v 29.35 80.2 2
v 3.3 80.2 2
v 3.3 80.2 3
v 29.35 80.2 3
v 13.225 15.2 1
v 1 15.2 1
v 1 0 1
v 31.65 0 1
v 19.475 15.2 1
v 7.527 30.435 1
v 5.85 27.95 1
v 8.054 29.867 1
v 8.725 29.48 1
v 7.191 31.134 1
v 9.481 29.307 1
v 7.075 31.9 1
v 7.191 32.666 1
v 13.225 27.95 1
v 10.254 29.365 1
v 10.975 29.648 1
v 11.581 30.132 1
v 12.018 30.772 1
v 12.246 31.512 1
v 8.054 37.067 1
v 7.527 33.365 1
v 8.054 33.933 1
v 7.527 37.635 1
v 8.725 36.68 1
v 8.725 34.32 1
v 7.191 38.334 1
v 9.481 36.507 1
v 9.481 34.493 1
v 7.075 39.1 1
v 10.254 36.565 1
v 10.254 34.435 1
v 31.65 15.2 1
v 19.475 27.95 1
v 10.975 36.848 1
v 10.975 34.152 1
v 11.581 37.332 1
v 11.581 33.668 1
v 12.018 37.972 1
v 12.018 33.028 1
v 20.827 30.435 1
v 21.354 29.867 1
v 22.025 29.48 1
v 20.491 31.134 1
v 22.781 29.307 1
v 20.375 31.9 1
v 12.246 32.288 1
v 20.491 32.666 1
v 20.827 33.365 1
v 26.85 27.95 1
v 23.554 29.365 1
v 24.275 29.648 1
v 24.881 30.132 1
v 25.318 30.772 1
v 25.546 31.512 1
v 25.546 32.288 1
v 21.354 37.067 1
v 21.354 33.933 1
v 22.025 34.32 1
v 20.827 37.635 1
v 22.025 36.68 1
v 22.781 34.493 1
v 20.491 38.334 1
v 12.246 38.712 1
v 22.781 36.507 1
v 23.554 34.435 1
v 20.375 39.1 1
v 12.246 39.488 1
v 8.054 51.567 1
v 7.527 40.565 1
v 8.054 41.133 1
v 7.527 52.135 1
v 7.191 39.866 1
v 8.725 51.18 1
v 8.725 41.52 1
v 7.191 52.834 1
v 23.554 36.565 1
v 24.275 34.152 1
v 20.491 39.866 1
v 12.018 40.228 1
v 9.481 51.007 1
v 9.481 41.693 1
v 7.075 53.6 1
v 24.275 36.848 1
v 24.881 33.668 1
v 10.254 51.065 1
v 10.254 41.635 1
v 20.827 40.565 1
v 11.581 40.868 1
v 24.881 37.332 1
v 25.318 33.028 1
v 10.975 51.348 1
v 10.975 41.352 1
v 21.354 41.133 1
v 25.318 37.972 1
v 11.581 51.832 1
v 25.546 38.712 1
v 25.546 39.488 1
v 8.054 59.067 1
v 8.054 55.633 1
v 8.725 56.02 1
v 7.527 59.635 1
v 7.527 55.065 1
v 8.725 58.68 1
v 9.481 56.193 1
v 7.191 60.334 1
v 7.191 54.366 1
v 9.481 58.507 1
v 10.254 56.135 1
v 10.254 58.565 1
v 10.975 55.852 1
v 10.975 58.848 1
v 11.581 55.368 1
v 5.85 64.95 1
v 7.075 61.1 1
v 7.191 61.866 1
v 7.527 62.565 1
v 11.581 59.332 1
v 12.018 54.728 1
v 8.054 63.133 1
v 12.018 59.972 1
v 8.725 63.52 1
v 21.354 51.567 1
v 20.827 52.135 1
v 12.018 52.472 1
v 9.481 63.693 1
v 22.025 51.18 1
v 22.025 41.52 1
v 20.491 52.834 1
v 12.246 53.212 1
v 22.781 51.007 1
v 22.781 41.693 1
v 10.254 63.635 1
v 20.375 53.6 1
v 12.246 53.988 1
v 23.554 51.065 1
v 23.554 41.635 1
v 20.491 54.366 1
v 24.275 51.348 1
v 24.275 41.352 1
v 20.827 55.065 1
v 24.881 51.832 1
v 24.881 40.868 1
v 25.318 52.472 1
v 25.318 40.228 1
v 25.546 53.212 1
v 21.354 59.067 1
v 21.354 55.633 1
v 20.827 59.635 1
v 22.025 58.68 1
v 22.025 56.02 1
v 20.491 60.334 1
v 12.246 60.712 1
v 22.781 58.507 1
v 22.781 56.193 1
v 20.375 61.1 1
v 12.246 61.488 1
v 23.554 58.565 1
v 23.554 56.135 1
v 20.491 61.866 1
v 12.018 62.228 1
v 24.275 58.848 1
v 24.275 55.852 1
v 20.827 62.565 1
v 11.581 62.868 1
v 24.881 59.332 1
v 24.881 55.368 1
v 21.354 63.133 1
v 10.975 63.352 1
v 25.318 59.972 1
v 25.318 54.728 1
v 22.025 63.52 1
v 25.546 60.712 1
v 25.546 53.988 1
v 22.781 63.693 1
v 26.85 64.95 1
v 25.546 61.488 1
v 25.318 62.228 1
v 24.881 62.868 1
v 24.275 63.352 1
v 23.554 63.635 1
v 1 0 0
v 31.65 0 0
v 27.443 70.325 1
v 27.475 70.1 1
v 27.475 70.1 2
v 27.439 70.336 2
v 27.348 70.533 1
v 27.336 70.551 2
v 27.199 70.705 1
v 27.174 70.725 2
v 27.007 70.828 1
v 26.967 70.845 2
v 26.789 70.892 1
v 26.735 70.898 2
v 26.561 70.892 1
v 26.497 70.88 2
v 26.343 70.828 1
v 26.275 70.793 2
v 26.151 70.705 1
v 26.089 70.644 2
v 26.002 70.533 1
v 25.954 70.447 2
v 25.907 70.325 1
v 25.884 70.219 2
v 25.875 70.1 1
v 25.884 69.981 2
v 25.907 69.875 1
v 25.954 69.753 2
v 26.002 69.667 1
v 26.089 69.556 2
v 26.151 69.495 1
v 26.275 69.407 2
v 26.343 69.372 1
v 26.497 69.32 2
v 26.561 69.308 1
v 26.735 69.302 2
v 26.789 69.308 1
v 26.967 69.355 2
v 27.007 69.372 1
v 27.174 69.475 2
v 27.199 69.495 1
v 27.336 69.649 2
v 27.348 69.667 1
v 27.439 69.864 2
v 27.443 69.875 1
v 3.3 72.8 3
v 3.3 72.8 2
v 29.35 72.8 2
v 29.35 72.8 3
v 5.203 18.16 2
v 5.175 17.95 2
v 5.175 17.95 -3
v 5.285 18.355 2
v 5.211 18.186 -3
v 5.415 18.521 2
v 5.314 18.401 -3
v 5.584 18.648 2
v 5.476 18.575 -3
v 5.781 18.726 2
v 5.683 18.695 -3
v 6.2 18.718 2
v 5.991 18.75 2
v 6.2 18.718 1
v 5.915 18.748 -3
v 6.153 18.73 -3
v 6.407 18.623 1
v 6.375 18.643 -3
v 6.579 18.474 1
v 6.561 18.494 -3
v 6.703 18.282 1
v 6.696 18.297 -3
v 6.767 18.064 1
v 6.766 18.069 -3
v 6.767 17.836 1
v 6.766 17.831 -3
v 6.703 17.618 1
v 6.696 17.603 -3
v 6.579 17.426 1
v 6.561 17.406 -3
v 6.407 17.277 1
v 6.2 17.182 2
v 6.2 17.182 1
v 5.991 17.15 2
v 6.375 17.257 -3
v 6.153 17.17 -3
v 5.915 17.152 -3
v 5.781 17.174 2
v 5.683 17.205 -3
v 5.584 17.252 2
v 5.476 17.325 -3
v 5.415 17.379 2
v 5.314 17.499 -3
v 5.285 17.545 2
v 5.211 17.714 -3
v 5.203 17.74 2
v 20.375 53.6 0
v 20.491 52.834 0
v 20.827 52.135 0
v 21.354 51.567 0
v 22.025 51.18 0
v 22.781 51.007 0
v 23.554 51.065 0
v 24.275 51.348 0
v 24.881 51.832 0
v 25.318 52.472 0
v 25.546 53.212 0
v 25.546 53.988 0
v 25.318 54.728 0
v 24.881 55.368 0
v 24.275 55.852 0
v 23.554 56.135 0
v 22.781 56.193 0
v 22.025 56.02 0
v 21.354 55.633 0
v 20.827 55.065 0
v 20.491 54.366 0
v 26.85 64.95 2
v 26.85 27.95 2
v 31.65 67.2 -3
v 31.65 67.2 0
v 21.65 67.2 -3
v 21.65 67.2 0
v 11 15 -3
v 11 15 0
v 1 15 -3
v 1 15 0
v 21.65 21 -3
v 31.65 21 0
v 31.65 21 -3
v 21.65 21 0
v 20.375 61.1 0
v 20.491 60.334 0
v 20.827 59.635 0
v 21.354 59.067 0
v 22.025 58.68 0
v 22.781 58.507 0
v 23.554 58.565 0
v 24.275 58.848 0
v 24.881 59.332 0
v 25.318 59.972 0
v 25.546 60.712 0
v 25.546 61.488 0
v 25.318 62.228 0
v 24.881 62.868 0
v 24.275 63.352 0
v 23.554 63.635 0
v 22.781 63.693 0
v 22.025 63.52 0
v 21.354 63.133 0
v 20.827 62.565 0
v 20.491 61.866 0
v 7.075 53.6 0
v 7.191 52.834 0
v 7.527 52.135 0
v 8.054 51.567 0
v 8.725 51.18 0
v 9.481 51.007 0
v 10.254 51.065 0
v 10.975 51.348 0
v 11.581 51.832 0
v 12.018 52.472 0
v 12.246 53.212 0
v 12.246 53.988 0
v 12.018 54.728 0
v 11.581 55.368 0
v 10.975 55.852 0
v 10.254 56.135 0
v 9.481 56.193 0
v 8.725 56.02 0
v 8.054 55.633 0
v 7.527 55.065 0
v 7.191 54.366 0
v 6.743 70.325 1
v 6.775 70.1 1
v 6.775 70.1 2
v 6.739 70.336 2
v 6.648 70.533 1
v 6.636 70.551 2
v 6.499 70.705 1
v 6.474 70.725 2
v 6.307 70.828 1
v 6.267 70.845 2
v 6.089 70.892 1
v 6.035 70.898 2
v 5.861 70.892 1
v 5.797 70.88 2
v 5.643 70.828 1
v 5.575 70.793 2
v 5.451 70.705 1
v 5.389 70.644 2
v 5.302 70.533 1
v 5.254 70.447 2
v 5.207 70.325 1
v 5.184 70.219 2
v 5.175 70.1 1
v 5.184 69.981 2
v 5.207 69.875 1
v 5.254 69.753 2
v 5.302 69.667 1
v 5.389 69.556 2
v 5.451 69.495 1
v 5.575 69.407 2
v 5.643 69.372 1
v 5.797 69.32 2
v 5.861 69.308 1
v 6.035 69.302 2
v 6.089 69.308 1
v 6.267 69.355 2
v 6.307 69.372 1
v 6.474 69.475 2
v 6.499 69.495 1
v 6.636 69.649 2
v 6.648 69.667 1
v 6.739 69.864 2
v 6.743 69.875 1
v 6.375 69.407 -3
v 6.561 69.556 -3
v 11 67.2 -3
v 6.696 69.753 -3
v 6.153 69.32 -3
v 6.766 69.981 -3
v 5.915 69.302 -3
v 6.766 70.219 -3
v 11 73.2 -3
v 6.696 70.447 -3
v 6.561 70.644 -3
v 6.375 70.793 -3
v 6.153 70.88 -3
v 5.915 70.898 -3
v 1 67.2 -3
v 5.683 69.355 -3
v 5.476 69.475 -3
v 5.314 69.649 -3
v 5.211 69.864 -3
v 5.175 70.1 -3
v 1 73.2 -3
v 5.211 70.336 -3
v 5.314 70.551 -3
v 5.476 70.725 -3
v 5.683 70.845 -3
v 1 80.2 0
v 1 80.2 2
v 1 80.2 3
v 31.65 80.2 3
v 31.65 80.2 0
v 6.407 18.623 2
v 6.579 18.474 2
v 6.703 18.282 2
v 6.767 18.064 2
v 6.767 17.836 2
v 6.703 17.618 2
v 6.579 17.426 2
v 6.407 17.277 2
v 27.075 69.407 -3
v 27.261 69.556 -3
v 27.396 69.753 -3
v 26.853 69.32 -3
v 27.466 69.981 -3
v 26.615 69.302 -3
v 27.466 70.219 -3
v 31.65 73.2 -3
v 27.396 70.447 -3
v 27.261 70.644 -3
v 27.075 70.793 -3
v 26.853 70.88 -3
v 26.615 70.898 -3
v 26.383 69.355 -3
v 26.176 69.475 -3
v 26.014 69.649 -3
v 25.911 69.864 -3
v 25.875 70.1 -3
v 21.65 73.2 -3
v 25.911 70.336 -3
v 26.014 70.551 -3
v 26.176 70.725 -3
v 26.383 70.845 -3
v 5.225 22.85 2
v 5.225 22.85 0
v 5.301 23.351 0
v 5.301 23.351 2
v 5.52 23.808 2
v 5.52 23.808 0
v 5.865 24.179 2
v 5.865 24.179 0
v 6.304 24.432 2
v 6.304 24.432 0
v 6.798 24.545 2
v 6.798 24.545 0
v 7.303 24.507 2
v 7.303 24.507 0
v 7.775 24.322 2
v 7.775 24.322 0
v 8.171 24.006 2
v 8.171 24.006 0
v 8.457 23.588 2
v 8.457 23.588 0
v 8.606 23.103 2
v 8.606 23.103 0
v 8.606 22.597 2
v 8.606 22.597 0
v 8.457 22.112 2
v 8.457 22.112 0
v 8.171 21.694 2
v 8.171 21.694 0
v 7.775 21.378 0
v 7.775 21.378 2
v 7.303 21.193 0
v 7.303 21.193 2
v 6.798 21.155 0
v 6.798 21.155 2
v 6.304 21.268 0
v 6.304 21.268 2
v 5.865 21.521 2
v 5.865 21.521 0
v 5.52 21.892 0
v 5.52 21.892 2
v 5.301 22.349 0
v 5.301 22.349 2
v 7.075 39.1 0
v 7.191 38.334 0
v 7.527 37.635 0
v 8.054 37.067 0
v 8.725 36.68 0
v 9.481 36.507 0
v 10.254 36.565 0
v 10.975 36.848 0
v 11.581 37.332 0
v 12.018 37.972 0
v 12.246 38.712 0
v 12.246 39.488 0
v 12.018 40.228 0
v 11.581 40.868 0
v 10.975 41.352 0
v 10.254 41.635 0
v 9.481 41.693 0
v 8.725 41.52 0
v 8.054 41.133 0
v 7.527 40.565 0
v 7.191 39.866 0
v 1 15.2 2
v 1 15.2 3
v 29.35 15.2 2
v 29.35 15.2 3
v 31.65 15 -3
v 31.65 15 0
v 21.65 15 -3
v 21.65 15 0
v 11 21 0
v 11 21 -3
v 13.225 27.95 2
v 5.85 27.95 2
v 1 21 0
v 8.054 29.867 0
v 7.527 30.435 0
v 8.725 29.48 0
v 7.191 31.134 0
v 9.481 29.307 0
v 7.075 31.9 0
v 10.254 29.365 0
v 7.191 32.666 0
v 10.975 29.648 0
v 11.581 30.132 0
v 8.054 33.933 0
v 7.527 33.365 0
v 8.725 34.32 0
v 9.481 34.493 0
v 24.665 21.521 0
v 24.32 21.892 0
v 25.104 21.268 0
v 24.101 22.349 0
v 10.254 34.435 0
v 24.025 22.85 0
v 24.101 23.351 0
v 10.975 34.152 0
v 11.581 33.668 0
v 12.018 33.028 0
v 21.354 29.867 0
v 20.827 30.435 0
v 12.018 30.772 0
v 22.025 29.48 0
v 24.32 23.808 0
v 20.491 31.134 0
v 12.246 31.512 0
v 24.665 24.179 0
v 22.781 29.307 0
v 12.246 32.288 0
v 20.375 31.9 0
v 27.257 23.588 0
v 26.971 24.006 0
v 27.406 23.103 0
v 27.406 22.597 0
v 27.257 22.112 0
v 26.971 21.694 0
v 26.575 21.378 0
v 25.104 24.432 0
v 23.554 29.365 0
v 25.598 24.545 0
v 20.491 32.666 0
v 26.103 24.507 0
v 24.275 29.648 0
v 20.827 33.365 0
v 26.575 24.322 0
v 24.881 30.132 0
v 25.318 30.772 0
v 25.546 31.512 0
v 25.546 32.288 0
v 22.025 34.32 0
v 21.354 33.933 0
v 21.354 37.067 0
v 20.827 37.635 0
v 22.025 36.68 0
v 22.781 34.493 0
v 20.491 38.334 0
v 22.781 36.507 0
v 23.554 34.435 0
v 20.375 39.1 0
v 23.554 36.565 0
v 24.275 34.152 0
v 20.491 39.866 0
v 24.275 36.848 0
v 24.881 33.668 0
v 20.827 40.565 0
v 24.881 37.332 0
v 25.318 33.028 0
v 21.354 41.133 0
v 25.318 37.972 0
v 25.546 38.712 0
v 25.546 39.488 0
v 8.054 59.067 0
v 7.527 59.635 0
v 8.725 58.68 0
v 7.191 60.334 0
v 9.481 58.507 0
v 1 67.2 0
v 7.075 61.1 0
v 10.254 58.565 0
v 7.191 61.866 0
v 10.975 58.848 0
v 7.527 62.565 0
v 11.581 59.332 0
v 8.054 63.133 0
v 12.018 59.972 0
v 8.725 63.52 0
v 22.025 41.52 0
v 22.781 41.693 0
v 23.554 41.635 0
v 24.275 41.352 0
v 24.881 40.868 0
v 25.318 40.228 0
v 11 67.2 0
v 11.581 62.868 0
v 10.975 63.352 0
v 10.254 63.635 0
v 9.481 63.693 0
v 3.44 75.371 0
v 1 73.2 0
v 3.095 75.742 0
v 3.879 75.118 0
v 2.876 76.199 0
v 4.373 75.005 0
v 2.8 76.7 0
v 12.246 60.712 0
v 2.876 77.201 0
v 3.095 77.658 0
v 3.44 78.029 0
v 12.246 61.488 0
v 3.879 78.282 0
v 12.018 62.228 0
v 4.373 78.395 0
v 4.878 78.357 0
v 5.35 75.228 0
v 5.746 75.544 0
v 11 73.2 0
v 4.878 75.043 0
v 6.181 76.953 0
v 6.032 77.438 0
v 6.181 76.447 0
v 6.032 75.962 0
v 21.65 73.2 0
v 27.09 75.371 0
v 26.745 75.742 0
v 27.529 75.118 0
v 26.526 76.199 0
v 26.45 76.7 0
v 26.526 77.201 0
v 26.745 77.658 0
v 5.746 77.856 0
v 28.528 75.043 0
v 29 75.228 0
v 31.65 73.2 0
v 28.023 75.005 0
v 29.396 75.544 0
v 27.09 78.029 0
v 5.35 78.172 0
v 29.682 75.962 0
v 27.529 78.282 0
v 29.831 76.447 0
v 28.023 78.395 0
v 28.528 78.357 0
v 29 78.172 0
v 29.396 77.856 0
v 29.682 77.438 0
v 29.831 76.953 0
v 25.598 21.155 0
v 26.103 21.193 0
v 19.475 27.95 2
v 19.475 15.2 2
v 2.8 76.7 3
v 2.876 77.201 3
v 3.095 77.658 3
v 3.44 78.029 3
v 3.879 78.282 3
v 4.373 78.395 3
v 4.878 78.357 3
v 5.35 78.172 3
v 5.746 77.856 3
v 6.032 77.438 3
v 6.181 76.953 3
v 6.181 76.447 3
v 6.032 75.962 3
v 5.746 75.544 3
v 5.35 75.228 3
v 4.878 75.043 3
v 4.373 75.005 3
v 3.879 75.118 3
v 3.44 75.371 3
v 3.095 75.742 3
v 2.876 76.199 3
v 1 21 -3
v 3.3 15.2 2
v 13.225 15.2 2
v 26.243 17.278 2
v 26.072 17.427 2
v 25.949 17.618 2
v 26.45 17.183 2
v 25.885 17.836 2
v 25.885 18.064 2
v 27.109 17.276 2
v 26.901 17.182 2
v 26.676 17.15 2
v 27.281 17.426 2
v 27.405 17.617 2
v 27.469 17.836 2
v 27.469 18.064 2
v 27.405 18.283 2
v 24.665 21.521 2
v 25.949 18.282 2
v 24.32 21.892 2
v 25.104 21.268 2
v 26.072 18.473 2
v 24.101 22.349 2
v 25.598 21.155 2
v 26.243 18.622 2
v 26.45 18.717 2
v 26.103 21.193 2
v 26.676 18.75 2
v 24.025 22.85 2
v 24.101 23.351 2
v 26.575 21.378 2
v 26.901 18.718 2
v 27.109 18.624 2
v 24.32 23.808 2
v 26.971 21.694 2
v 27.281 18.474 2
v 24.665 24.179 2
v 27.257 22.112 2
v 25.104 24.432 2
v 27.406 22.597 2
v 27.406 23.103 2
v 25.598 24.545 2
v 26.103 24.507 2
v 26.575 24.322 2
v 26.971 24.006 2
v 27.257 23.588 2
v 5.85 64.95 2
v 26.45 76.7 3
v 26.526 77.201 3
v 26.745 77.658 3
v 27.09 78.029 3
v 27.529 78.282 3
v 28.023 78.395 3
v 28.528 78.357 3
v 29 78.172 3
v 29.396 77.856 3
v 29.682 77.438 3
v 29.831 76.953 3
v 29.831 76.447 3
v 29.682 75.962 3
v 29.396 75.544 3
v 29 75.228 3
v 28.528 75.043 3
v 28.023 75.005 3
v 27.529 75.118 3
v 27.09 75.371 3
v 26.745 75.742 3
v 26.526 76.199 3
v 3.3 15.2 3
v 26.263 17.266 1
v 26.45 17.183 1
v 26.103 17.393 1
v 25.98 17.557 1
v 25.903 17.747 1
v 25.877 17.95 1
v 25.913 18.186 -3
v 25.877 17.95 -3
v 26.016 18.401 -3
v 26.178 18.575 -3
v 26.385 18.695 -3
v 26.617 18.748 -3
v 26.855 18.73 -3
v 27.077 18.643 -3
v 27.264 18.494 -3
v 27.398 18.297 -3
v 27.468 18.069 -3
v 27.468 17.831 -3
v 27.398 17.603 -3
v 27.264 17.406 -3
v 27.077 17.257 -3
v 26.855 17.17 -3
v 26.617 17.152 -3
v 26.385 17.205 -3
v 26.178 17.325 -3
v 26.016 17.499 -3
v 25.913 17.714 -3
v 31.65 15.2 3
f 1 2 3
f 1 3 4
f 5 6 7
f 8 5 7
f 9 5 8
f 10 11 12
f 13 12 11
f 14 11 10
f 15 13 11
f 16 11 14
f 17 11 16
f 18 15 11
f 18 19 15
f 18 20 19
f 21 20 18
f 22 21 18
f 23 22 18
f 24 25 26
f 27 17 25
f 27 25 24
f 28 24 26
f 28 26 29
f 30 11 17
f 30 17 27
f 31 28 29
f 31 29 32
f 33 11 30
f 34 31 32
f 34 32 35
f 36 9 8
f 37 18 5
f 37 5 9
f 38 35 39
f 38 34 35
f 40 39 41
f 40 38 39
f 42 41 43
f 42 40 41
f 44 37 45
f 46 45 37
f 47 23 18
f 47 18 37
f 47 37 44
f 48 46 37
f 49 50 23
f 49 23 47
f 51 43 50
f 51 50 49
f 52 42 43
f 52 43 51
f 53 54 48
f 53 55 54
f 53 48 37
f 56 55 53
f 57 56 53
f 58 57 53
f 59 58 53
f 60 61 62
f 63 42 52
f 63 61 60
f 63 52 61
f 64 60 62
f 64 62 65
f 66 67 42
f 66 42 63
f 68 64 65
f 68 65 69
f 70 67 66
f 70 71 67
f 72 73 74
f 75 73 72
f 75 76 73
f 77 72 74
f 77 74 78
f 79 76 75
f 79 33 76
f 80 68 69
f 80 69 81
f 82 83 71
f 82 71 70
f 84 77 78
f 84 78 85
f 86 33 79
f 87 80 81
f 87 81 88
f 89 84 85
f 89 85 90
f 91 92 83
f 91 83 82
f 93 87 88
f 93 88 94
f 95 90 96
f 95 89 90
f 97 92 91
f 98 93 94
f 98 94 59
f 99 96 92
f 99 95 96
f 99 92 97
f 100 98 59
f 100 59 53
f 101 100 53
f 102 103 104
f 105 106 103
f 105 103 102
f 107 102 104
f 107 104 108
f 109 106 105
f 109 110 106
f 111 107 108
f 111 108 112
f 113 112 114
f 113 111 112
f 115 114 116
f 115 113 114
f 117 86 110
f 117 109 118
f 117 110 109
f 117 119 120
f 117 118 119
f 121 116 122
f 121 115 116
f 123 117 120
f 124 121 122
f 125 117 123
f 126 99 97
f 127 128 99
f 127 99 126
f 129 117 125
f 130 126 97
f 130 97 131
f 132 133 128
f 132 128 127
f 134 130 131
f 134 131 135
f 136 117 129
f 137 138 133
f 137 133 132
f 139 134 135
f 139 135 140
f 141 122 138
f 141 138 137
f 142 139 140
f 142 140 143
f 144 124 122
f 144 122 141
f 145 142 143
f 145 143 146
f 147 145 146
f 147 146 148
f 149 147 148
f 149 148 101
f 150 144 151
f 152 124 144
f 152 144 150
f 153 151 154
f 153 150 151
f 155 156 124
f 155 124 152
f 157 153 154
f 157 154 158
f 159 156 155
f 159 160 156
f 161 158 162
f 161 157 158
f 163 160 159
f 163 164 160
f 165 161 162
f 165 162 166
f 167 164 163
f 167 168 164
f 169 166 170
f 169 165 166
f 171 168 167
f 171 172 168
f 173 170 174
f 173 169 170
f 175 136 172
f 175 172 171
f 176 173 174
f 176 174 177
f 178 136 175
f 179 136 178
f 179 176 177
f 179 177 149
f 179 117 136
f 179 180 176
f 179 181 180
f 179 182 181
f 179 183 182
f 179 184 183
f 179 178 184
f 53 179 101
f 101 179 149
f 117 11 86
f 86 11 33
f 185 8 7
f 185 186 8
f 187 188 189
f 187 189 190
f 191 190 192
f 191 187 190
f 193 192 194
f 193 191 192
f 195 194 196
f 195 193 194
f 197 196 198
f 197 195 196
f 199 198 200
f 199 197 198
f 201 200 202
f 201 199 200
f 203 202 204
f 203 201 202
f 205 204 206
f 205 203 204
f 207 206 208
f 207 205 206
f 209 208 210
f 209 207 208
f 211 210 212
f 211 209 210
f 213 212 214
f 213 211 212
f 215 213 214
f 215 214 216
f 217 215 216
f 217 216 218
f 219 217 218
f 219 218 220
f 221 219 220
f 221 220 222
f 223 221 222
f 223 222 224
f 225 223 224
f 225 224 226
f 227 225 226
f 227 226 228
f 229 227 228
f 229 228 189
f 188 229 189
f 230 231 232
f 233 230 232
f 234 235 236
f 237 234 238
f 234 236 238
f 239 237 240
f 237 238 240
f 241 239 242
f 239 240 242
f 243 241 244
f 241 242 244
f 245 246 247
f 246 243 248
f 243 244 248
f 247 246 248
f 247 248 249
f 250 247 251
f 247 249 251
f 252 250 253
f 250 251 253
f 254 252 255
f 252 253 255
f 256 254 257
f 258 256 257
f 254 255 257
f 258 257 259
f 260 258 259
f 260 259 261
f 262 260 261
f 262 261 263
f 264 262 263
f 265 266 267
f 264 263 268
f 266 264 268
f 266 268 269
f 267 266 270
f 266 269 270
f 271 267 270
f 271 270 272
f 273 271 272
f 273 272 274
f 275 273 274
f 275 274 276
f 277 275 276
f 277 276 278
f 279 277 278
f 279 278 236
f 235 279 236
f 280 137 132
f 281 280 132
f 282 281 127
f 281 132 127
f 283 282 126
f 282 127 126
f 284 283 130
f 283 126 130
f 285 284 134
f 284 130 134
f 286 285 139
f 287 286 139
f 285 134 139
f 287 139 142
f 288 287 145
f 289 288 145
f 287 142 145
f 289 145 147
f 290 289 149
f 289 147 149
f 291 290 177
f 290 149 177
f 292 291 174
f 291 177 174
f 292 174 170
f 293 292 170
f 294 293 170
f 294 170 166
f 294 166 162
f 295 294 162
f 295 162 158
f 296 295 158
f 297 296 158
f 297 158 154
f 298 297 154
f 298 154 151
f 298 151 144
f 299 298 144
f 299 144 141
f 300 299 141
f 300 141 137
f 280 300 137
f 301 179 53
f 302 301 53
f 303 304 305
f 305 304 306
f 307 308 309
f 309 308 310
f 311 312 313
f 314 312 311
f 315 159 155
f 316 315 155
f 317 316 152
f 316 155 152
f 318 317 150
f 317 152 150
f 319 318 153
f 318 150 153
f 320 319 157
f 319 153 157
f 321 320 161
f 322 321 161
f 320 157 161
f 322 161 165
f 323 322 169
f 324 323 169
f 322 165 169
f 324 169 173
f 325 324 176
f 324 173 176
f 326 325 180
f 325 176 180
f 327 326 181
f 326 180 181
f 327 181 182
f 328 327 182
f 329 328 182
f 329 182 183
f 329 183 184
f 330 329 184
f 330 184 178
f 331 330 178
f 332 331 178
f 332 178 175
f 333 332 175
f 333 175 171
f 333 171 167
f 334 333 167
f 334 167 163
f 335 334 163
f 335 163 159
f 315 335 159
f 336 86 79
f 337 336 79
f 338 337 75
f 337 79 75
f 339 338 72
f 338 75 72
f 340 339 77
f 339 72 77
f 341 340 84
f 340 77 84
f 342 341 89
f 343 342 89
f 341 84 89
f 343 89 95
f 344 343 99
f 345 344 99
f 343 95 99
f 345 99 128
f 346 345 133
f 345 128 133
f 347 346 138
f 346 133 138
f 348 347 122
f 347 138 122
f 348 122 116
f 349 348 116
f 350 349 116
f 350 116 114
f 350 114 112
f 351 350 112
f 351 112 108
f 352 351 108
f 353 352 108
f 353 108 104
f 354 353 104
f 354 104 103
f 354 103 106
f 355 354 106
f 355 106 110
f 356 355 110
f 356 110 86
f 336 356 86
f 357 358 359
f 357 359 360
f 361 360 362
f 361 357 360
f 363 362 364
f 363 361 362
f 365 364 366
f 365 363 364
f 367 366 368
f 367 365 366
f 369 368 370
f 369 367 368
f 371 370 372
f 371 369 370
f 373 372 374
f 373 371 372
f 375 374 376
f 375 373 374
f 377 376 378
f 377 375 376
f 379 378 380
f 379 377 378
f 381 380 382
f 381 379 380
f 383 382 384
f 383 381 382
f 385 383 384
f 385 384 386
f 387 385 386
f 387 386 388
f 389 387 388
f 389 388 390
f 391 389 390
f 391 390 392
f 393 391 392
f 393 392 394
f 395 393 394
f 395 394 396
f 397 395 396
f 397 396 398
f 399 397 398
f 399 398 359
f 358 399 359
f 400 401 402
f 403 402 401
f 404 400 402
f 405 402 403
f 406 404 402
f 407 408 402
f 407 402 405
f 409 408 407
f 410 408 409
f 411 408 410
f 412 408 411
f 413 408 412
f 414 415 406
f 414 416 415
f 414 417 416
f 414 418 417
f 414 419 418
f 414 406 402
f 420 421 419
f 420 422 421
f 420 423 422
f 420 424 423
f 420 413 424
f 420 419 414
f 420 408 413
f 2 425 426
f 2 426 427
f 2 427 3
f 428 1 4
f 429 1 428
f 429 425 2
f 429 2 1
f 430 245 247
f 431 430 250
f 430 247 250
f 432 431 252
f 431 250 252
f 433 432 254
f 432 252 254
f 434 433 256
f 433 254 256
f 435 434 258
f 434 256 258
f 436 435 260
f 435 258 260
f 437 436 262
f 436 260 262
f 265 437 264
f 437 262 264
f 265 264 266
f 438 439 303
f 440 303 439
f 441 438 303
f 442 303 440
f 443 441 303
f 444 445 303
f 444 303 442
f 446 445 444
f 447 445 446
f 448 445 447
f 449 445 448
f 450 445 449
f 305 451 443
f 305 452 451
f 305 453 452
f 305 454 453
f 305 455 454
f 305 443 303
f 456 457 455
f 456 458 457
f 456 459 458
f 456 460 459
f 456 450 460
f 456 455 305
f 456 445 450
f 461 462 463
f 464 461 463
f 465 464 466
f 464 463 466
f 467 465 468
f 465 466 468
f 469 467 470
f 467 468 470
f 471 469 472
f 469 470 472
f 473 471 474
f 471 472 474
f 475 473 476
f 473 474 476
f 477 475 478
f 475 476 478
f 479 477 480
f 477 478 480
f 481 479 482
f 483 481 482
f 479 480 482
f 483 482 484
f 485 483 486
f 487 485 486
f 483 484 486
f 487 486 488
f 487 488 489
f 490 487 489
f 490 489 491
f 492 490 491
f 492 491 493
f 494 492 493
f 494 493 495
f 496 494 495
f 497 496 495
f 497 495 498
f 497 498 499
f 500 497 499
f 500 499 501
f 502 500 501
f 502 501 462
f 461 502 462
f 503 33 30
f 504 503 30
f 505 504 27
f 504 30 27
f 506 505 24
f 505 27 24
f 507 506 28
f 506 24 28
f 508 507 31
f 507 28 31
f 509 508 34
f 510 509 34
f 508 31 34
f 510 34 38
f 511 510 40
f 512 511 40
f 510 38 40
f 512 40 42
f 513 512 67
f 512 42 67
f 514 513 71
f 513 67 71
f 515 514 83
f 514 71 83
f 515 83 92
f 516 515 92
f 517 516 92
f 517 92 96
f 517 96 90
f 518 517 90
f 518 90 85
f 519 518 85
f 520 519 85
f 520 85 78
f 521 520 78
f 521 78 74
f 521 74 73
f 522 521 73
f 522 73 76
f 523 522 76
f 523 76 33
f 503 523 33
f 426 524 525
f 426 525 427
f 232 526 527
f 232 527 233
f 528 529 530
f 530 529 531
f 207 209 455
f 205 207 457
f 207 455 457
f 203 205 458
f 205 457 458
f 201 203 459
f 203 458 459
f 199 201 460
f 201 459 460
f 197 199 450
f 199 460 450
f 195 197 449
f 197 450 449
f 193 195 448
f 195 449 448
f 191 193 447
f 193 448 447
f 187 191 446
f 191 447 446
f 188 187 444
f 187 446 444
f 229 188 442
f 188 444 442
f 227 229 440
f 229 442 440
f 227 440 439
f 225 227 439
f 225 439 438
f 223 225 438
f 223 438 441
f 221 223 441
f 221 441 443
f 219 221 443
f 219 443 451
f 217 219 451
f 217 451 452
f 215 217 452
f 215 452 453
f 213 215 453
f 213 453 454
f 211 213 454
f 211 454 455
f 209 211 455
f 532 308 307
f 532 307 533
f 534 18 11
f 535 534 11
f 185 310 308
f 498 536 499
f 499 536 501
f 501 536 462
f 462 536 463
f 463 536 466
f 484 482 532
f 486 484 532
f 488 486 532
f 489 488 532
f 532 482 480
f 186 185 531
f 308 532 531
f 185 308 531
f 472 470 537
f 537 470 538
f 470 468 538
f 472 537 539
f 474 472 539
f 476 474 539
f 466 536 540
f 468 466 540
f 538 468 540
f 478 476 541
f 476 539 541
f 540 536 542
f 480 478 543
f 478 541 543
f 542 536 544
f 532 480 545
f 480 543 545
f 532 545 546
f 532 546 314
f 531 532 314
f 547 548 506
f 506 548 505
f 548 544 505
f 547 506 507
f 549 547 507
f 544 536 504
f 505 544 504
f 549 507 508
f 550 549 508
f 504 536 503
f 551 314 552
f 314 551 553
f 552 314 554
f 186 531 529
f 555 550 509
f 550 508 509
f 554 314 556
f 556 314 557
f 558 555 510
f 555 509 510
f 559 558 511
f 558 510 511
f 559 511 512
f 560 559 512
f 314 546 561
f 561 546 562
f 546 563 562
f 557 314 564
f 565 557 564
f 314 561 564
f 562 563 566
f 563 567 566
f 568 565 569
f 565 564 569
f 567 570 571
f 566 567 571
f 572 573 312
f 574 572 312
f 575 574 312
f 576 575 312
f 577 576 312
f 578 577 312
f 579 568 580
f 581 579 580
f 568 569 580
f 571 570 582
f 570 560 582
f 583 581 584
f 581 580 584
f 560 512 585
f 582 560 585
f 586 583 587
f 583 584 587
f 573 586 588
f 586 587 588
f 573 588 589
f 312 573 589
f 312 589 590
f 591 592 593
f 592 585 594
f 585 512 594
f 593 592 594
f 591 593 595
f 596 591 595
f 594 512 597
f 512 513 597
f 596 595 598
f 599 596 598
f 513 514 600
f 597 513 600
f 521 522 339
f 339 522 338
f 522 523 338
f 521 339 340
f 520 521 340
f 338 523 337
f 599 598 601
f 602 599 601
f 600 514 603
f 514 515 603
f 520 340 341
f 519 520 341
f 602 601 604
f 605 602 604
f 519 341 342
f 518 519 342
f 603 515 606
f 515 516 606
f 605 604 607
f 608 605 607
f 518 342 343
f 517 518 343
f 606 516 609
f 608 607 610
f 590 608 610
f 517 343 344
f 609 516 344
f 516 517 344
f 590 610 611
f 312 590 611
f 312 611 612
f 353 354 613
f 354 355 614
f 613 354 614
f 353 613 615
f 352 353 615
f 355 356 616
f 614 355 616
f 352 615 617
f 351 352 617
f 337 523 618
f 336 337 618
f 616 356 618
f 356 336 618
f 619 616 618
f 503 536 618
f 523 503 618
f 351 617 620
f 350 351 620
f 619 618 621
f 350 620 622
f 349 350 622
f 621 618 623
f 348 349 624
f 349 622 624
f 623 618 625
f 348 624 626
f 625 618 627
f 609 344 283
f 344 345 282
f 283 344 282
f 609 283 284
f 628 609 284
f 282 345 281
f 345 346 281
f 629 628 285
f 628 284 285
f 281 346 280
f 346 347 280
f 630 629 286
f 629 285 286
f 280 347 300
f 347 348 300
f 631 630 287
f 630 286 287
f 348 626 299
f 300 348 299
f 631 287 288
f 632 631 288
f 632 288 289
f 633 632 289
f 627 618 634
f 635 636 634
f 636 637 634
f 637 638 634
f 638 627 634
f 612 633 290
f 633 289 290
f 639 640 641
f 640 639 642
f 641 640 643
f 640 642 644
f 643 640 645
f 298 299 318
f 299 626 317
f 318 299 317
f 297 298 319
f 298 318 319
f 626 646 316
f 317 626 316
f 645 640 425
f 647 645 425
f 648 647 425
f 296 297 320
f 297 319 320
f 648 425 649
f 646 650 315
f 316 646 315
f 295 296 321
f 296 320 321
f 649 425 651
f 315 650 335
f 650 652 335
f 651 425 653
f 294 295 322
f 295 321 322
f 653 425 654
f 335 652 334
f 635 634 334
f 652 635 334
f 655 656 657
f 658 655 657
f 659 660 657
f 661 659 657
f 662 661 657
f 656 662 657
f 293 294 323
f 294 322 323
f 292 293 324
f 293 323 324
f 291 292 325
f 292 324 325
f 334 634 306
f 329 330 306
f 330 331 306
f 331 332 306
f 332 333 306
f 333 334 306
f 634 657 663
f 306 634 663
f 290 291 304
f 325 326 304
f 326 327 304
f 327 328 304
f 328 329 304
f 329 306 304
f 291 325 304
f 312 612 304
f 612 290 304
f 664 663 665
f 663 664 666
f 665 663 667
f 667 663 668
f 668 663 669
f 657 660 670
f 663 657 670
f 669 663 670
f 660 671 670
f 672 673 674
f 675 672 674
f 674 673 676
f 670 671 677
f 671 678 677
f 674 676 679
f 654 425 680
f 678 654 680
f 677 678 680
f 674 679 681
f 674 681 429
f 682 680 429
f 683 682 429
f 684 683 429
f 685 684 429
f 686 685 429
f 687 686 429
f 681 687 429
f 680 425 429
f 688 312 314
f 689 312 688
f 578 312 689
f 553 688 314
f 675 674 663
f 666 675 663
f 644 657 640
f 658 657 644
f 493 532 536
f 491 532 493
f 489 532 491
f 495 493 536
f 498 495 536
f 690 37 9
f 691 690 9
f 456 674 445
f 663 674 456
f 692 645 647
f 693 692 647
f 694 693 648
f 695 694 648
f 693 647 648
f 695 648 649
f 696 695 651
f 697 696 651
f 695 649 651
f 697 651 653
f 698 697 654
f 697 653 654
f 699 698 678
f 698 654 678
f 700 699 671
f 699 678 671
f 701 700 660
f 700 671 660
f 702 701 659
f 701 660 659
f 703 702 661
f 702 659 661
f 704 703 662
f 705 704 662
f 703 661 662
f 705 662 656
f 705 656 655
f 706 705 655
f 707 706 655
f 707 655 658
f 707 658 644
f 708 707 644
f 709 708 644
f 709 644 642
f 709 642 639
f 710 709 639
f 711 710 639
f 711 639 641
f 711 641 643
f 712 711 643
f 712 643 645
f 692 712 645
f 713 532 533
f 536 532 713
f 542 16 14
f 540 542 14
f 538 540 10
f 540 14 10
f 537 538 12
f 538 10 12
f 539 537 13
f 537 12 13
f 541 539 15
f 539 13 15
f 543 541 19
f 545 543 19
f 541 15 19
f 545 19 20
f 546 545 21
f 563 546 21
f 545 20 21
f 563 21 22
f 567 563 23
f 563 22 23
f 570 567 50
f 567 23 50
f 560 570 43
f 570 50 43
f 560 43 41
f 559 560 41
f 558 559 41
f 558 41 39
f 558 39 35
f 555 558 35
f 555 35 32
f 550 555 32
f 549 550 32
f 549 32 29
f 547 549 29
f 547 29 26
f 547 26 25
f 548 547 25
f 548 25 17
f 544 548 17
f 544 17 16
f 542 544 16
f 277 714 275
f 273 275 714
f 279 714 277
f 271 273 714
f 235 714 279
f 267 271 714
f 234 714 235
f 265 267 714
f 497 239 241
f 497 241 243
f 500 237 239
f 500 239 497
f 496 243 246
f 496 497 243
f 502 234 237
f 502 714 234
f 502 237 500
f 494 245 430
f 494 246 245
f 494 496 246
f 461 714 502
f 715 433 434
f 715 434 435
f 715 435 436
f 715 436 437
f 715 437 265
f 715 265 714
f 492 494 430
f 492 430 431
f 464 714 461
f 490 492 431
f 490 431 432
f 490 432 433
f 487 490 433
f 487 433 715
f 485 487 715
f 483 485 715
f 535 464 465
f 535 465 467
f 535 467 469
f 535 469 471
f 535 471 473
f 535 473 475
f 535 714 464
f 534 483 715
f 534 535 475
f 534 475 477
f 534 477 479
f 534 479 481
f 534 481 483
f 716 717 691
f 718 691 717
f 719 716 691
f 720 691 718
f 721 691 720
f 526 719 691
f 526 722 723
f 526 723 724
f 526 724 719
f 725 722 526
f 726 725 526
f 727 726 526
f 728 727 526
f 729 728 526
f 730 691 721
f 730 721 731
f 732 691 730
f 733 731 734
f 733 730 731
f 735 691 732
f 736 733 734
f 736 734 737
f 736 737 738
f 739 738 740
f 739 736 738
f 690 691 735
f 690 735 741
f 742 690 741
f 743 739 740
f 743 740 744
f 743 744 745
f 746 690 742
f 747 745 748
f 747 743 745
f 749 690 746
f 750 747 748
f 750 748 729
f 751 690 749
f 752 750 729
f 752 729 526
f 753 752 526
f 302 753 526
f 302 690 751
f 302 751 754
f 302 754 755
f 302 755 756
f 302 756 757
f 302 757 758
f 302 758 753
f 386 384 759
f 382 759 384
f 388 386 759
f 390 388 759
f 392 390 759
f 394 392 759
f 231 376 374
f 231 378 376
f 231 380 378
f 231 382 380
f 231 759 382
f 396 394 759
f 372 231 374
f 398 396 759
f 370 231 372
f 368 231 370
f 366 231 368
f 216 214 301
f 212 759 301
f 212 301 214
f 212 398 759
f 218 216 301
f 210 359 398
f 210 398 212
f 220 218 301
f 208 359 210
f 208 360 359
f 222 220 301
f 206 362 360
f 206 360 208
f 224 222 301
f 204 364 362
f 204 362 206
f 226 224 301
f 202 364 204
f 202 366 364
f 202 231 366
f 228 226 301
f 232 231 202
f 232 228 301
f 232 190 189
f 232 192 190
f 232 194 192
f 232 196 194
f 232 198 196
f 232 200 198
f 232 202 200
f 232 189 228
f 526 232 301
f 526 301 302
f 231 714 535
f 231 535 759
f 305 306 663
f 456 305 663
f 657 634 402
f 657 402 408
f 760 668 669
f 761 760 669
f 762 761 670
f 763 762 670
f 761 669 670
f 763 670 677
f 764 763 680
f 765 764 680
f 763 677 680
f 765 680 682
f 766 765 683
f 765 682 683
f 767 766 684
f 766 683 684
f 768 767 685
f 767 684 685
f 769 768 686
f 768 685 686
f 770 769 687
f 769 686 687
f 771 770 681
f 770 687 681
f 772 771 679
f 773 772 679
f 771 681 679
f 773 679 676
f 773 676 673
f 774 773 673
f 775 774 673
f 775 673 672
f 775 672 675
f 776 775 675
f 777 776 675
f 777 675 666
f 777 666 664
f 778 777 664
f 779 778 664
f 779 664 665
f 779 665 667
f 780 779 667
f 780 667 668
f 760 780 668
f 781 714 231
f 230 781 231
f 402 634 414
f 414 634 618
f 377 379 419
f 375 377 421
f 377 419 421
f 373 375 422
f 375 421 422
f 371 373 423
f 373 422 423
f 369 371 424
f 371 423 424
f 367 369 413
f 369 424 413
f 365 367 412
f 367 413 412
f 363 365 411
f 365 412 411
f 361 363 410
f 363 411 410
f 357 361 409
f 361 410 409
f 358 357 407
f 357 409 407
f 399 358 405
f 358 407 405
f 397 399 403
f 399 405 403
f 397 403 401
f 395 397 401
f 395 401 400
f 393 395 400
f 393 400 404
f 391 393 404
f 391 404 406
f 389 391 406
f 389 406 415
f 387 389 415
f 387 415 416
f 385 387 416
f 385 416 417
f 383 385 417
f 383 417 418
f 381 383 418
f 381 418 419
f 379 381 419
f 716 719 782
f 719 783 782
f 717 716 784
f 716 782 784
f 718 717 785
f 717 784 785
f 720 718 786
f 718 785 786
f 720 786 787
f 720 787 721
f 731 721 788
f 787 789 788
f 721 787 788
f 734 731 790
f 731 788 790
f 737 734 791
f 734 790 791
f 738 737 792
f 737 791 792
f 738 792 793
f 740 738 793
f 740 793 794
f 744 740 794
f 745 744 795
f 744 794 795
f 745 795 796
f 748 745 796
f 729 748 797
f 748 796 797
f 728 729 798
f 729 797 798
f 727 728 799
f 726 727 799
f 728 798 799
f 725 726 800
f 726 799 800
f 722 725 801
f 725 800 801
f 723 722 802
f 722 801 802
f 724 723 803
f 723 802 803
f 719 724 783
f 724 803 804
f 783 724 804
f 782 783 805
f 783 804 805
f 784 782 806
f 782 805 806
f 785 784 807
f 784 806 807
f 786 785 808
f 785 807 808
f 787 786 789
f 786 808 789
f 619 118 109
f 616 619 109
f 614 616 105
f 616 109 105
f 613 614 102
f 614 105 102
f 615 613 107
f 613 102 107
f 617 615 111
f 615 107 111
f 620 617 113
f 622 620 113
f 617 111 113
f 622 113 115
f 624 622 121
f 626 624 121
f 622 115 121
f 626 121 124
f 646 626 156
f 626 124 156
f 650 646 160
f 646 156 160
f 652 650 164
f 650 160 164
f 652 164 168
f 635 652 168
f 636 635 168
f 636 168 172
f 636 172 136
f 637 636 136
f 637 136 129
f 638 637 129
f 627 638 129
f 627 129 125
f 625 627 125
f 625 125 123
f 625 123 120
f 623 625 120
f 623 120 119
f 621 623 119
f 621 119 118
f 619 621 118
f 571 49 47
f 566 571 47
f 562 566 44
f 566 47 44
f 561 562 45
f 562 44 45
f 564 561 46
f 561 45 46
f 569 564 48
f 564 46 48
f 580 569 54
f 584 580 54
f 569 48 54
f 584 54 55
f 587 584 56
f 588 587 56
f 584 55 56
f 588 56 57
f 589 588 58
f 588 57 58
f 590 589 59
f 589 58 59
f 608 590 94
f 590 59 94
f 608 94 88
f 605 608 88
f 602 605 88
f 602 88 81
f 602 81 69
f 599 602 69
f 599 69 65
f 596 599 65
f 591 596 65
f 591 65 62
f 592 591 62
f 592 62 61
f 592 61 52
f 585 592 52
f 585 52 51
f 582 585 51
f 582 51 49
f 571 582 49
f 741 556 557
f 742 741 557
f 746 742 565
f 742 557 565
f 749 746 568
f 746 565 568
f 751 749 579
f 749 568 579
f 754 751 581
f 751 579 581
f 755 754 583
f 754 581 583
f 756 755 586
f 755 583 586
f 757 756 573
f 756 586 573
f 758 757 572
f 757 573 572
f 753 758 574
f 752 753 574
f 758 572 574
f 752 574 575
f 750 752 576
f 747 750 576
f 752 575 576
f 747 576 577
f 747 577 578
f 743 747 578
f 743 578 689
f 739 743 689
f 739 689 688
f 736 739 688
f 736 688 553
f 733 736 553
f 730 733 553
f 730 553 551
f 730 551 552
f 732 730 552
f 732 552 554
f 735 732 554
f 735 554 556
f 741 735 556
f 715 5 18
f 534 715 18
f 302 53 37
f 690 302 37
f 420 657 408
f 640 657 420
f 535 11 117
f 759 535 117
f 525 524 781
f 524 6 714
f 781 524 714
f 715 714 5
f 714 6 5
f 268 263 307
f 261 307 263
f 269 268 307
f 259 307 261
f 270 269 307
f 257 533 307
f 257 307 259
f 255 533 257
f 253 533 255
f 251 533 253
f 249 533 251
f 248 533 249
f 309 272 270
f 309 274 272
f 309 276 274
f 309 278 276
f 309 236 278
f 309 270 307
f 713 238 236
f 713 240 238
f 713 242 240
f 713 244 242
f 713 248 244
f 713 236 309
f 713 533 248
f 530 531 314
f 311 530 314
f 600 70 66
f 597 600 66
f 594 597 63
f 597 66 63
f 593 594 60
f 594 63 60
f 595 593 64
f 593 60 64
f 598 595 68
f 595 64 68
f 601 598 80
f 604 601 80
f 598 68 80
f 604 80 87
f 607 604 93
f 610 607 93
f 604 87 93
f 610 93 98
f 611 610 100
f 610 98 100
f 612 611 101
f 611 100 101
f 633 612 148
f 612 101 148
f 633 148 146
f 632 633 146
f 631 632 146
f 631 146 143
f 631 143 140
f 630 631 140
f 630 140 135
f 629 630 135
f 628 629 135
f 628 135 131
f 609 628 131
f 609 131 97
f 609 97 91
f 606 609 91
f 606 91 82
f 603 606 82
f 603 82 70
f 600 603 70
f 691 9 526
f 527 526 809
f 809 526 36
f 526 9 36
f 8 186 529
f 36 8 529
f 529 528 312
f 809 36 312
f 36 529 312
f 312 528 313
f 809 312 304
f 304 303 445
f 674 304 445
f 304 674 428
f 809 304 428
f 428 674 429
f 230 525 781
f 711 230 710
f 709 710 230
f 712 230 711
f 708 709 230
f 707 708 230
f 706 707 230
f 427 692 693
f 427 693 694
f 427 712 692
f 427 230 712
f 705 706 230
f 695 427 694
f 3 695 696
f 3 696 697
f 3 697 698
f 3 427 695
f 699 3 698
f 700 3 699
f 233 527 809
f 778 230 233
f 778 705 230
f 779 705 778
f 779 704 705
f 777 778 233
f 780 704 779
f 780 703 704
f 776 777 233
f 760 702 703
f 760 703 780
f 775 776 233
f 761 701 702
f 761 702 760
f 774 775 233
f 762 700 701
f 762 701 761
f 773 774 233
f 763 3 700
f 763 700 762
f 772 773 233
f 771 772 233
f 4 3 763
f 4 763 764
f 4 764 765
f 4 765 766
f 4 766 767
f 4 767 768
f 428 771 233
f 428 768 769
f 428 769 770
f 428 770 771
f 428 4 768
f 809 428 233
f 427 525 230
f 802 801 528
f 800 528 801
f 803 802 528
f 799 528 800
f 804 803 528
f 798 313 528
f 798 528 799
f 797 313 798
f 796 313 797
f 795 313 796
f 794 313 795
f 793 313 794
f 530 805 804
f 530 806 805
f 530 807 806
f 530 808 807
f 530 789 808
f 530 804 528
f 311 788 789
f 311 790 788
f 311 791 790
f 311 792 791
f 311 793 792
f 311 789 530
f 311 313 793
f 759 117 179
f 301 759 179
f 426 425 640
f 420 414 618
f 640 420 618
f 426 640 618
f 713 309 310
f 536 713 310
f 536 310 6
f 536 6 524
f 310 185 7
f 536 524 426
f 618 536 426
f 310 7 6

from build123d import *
from build123d.topology import SkipClean

# Parameters (mm, degrees)
SKETCH1_W                   = 32.65
SKETCH1_H                   = 81.2
BOSS_EXTRUDE1_DEPTH         = 1
BOSS_EXTRUDE2_DEPTH         = 4
SKETCH3_W                   = 5.2
SKETCH3_H                   = 5.2
BOSS_EXTRUDE3_DEPTH         = 1
F_3DSKETCH1_R               = 2
CUT_EXTRUDE13_DEPTH         = 15
F_3DSKETCH2_R               = 2.6
CUT_EXTRUDE14_DEPTH         = 24
CUT_EXTRUDE20_START         = -6.9
SKETCH7_R                   = 2
CUT_EXTRUDE20_DEPTH         = 6.9
SKETCH8_W                   = 1
SKETCH8_H                   = 5
CUT_EXTRUDE21_DEPTH         = 88.661066044
SKETCH9_W                   = 5
SKETCH9_H                   = 1
CUT_EXTRUDE23_DEPTH         = 87.935967815
SKETCH11_W                  = 10
SKETCH11_H                  = 6
BOSS_EXTRUDE4_DEPTH         = 3
TAP_DRILL_FOR_M2X0_4_TAP1_D = 1.6
TAP_DRILL_FOR_M2X0_4_TAP2_D = 1.6
SKETCH37_R                  = 0.8
BOSS_EXTRUDE11_DEPTH        = 1
SKETCH40_W                  = 2.3
SKETCH40_H                  = 65
BOSS_EXTRUDE12_DEPTH        = 1
SKETCH41_W                  = 26.05
SKETCH41_H                  = 7.4
BOSS_EXTRUDE13_DEPTH        = 1
M3_CLEARANCE_HOLE1_D        = 3.4
M3_CLEARANCE_HOLE2_D        = 3.4


with BuildPart() as part:
    # Sketch1 → Boss-Extrude1 (new body)
    with BuildSketch(Plane.XY):
        with Locations((16.325, 40.6)):
            Rectangle(SKETCH1_W, SKETCH1_H)
    extrude(amount=BOSS_EXTRUDE1_DEPTH)

    # Sketch2 → Boss-Extrude2 (add)
    with BuildSketch(Plane.XY.offset(1)):
        Polygon((0, 0), (0, 81.2), (32.65, 81.2), (32.65, 0), (31.65, 0), (31.65, 80.2), (1, 80.2), (1, 0), align=None)
    extrude(amount=BOSS_EXTRUDE2_DEPTH)

    # Sketch3 → Boss-Extrude3 (add)
    with BuildSketch(Plane.XY.offset(1)):
        with Locations((3.6, 77.6)):
            Rectangle(SKETCH3_W, SKETCH3_H)
        with Locations((3.6, 17.8)):
            Rectangle(SKETCH3_W, SKETCH3_H)
        with Locations((29.05, 17.8)):
            Rectangle(SKETCH3_W, SKETCH3_H)
        with Locations((29.05, 77.6)):
            Rectangle(SKETCH3_W, SKETCH3_H)
    extrude(amount=BOSS_EXTRUDE3_DEPTH)

    # 3DSketch1 → Cut-Extrude13 (cut)
    with BuildSketch(Plane(origin=(11.325, 80.2, 4), x_dir=(1, 0, 0), z_dir=(0, -1, 0))):
        Circle(F_3DSKETCH1_R)
        with Locations((10, 0)):
            Circle(F_3DSKETCH1_R)
    extrude(amount=-CUT_EXTRUDE13_DEPTH, mode=Mode.SUBTRACT)

    # 3DSketch2 → Cut-Extrude14 (cut)
    with BuildSketch(Plane(origin=(9.675, 61.1, 1), x_dir=(0.4145072564800623, -0.910046006708107, 0), z_dir=(0, 0, 1))):
        with Locations(Location((0, 0, 0), (0, 0, 245.511710088))):
            Circle(F_3DSKETCH2_R)
        with Locations(Location((5.512946511, 12.103611889, 0), (0, 0, 245.511710088))):
            Circle(F_3DSKETCH2_R)
        with Locations(Location((6.82534505, -3.108804424, 0), (0, 0, 245.511710088))):
            Circle(F_3DSKETCH2_R)
        with Locations(Location((12.338291561, 8.994807466, 0), (0, 0, 245.511710088))):
            Circle(F_3DSKETCH2_R)
        with Locations(Location((20.021012148, -9.119159643, 0), (0, 0, 245.511710088))):
            Circle(F_3DSKETCH2_R)
        with Locations(Location((25.533958659, 2.984452247, 0), (0, 0, 245.511710088))):
            Circle(F_3DSKETCH2_R)
        with Locations(Location((26.573343396, -12.103611889, 0), (0, 0, 245.511710088))):
            Circle(F_3DSKETCH2_R)
        with Locations(Location((32.086289907, 0, 0), (0, 0, 245.511710088))):
            Circle(F_3DSKETCH2_R)
    extrude(amount=-CUT_EXTRUDE14_DEPTH, mode=Mode.SUBTRACT)

    # Sketch7 → Cut-Extrude20 (cut)
    with BuildSketch(Plane(origin=(0, 81.2, 0), x_dir=(1, 0, 0), z_dir=(0, 1, 0)).offset(CUT_EXTRUDE20_START)):
        with BuildLine():
            ThreePointArc((13.057050808, -5), (13.256851653, -4.51763809), (13.325, -4))
            ThreePointArc((13.325, -4), (10.80736191, -2.068148347), (9.592949192, -5))
            Line((9.592949192, -5), (13.057050808, -5))
        make_face()
        with BuildLine():
            Line((13.057050808, -5), (9.592949192, -5))
            ThreePointArc((9.592949192, -5), (11.325, -6), (13.057050808, -5))
        make_face()
        with BuildLine():
            ThreePointArc((9.592949192, -5), (11.325, -2), (13.057050808, -5))
            Line((13.057050808, -5), (9.592949192, -5))
        make_face()
        with Locations((21.308255446, -4.002965824)):
            Circle(SKETCH7_R)
    extrude(amount=CUT_EXTRUDE20_DEPTH, mode=Mode.SUBTRACT)

    # Sketch8 → Cut-Extrude21 (cut, through all)
    with BuildSketch(Plane.XZ):
        Polygon((1, 5), (0, 5), (0, 0), (1, 0), (1, 1), align=None)
        with Locations((32.15, 2.5)):
            Rectangle(SKETCH8_W, SKETCH8_H)
    extrude(amount=-CUT_EXTRUDE21_DEPTH, mode=Mode.SUBTRACT)

    # Sketch9 → Cut-Extrude23 (cut, through all)
    with BuildSketch(Plane(origin=(31.65, 0, 0), x_dir=(0, 0, -1), z_dir=(1, 0, 0))):
        with Locations((-2.5, 80.7)):
            Rectangle(SKETCH9_W, SKETCH9_H)
    extrude(amount=-CUT_EXTRUDE23_DEPTH, mode=Mode.SUBTRACT)

    # Sketch11 → Boss-Extrude4 (add)
    with BuildSketch(Plane(origin=(0, 0, 0), x_dir=(-1, 0, 0), z_dir=(0, 0, -1))):
        with Locations((-26.65, 18)):
            Rectangle(SKETCH11_W, SKETCH11_H)
        with Locations((-26.65, 70.2)):
            Rectangle(SKETCH11_W, SKETCH11_H)
        with Locations((-6, 70.2)):
            Rectangle(SKETCH11_W, SKETCH11_H)
        with Locations((-6, 18)):
            Rectangle(SKETCH11_W, SKETCH11_H)
    extrude(amount=BOSS_EXTRUDE4_DEPTH)

    # Tap Drill for M2x0.4 Tap1 (through all)
    with Locations(Plane(origin=(26.675, 70.1, 2), x_dir=(1, 0, 0), z_dir=(0, 0, 1))):
        with Locations((0, 0)):
            Hole(TAP_DRILL_FOR_M2X0_4_TAP1_D / 2)

    # Tap Drill for M2x0.4 Tap2 (through all)
    with Locations(Plane(origin=(5.975, 70.1, 2), x_dir=(1, 0, 0), z_dir=(0, 0, 1))):
        with Locations((0, 0), (0, -52.15), (20.702261821, -52.15)):
            Hole(TAP_DRILL_FOR_M2X0_4_TAP2_D / 2)

    # Sketch37 → Boss-Extrude11 (add)
    with SkipClean():  # the faces are left unmerged after this step: merging them gives an invalid solid
        with BuildSketch(Plane.XY.offset(1)):
            with BuildLine():
                Line((26.85, 64.95), (26.85, 27.95))
                Line((26.85, 27.95), (19.475, 27.95))
                Line((19.475, 27.95), (19.475, 15.2))
                Line((19.475, 15.2), (26.45, 15.2))
                Line((26.45, 15.2), (26.45, 17.18295889))
                ThreePointArc((26.45, 17.18295889), (25.877261821, 17.95), (26.45, 18.71704111))
                Line((26.45, 18.71704111), (26.45, 20.4))
                Line((26.45, 20.4), (31.65, 20.4))
                Line((31.65, 20.4), (31.65, 75))
                Line((31.65, 75), (26.45, 75))
                Line((26.45, 75), (26.45, 80.2))
                Line((26.45, 80.2), (6.2, 80.2))
                Line((6.2, 80.2), (6.2, 75))
                Line((6.2, 75), (1, 75))
                Line((1, 75), (1, 20.4))
                Line((1, 20.4), (6.2, 20.4))
                Line((6.2, 20.4), (6.2, 18.717707627))
                ThreePointArc((6.2, 18.717707627), (6.775, 17.95), (6.2, 17.182292373))
                Line((6.2, 17.182292373), (6.2, 15.2))
                Line((6.2, 15.2), (13.225, 15.2))
                Line((13.225, 15.2), (13.225, 27.95))
                Line((13.225, 27.95), (5.85, 27.95))
                Line((5.85, 27.95), (5.85, 64.95))
                Line((5.85, 64.95), (26.85, 64.95))
            make_face()
            with Locations((5.975, 70.1)):
                Circle(SKETCH37_R, mode=Mode.SUBTRACT)
            with Locations((26.675, 70.1)):
                Circle(SKETCH37_R, mode=Mode.SUBTRACT)
        extrude(amount=BOSS_EXTRUDE11_DEPTH)
    add(part.part.scale(1), mode=Mode.REPLACE)  # the faces are merged on a copy

    # Sketch40 → Boss-Extrude12 (add)
    with BuildSketch(Plane.XY.offset(2)):
        with Locations((30.5, 47.7)):
            Rectangle(SKETCH40_W, SKETCH40_H)
        with Locations((2.15, 47.7)):
            Rectangle(SKETCH40_W, SKETCH40_H)
    extrude(amount=BOSS_EXTRUDE12_DEPTH)

    # Sketch41 → Boss-Extrude13 (add)
    with BuildSketch(Plane.XY.offset(2)):
        with Locations((16.325, 76.5)):
            Rectangle(SKETCH41_W, SKETCH41_H)
    extrude(amount=BOSS_EXTRUDE13_DEPTH)

    # M3 Clearance Hole1 (through all)
    with Locations(Plane(origin=(4.5, 76.7, 3), x_dir=(1, 0, 0), z_dir=(0, 0, 1))):
        with Locations((0, 0), (23.65, 0)):
            Hole(M3_CLEARANCE_HOLE1_D / 2)

    # M3 Clearance Hole2 (through all)
    with Locations(Plane(origin=(6.925, 22.85, 2), x_dir=(1, 0, 0), z_dir=(0, 0, 1))):
        with Locations((0, 0), (18.8, 0)):
            Hole(M3_CLEARANCE_HOLE2_D / 2)


solid = part.part
